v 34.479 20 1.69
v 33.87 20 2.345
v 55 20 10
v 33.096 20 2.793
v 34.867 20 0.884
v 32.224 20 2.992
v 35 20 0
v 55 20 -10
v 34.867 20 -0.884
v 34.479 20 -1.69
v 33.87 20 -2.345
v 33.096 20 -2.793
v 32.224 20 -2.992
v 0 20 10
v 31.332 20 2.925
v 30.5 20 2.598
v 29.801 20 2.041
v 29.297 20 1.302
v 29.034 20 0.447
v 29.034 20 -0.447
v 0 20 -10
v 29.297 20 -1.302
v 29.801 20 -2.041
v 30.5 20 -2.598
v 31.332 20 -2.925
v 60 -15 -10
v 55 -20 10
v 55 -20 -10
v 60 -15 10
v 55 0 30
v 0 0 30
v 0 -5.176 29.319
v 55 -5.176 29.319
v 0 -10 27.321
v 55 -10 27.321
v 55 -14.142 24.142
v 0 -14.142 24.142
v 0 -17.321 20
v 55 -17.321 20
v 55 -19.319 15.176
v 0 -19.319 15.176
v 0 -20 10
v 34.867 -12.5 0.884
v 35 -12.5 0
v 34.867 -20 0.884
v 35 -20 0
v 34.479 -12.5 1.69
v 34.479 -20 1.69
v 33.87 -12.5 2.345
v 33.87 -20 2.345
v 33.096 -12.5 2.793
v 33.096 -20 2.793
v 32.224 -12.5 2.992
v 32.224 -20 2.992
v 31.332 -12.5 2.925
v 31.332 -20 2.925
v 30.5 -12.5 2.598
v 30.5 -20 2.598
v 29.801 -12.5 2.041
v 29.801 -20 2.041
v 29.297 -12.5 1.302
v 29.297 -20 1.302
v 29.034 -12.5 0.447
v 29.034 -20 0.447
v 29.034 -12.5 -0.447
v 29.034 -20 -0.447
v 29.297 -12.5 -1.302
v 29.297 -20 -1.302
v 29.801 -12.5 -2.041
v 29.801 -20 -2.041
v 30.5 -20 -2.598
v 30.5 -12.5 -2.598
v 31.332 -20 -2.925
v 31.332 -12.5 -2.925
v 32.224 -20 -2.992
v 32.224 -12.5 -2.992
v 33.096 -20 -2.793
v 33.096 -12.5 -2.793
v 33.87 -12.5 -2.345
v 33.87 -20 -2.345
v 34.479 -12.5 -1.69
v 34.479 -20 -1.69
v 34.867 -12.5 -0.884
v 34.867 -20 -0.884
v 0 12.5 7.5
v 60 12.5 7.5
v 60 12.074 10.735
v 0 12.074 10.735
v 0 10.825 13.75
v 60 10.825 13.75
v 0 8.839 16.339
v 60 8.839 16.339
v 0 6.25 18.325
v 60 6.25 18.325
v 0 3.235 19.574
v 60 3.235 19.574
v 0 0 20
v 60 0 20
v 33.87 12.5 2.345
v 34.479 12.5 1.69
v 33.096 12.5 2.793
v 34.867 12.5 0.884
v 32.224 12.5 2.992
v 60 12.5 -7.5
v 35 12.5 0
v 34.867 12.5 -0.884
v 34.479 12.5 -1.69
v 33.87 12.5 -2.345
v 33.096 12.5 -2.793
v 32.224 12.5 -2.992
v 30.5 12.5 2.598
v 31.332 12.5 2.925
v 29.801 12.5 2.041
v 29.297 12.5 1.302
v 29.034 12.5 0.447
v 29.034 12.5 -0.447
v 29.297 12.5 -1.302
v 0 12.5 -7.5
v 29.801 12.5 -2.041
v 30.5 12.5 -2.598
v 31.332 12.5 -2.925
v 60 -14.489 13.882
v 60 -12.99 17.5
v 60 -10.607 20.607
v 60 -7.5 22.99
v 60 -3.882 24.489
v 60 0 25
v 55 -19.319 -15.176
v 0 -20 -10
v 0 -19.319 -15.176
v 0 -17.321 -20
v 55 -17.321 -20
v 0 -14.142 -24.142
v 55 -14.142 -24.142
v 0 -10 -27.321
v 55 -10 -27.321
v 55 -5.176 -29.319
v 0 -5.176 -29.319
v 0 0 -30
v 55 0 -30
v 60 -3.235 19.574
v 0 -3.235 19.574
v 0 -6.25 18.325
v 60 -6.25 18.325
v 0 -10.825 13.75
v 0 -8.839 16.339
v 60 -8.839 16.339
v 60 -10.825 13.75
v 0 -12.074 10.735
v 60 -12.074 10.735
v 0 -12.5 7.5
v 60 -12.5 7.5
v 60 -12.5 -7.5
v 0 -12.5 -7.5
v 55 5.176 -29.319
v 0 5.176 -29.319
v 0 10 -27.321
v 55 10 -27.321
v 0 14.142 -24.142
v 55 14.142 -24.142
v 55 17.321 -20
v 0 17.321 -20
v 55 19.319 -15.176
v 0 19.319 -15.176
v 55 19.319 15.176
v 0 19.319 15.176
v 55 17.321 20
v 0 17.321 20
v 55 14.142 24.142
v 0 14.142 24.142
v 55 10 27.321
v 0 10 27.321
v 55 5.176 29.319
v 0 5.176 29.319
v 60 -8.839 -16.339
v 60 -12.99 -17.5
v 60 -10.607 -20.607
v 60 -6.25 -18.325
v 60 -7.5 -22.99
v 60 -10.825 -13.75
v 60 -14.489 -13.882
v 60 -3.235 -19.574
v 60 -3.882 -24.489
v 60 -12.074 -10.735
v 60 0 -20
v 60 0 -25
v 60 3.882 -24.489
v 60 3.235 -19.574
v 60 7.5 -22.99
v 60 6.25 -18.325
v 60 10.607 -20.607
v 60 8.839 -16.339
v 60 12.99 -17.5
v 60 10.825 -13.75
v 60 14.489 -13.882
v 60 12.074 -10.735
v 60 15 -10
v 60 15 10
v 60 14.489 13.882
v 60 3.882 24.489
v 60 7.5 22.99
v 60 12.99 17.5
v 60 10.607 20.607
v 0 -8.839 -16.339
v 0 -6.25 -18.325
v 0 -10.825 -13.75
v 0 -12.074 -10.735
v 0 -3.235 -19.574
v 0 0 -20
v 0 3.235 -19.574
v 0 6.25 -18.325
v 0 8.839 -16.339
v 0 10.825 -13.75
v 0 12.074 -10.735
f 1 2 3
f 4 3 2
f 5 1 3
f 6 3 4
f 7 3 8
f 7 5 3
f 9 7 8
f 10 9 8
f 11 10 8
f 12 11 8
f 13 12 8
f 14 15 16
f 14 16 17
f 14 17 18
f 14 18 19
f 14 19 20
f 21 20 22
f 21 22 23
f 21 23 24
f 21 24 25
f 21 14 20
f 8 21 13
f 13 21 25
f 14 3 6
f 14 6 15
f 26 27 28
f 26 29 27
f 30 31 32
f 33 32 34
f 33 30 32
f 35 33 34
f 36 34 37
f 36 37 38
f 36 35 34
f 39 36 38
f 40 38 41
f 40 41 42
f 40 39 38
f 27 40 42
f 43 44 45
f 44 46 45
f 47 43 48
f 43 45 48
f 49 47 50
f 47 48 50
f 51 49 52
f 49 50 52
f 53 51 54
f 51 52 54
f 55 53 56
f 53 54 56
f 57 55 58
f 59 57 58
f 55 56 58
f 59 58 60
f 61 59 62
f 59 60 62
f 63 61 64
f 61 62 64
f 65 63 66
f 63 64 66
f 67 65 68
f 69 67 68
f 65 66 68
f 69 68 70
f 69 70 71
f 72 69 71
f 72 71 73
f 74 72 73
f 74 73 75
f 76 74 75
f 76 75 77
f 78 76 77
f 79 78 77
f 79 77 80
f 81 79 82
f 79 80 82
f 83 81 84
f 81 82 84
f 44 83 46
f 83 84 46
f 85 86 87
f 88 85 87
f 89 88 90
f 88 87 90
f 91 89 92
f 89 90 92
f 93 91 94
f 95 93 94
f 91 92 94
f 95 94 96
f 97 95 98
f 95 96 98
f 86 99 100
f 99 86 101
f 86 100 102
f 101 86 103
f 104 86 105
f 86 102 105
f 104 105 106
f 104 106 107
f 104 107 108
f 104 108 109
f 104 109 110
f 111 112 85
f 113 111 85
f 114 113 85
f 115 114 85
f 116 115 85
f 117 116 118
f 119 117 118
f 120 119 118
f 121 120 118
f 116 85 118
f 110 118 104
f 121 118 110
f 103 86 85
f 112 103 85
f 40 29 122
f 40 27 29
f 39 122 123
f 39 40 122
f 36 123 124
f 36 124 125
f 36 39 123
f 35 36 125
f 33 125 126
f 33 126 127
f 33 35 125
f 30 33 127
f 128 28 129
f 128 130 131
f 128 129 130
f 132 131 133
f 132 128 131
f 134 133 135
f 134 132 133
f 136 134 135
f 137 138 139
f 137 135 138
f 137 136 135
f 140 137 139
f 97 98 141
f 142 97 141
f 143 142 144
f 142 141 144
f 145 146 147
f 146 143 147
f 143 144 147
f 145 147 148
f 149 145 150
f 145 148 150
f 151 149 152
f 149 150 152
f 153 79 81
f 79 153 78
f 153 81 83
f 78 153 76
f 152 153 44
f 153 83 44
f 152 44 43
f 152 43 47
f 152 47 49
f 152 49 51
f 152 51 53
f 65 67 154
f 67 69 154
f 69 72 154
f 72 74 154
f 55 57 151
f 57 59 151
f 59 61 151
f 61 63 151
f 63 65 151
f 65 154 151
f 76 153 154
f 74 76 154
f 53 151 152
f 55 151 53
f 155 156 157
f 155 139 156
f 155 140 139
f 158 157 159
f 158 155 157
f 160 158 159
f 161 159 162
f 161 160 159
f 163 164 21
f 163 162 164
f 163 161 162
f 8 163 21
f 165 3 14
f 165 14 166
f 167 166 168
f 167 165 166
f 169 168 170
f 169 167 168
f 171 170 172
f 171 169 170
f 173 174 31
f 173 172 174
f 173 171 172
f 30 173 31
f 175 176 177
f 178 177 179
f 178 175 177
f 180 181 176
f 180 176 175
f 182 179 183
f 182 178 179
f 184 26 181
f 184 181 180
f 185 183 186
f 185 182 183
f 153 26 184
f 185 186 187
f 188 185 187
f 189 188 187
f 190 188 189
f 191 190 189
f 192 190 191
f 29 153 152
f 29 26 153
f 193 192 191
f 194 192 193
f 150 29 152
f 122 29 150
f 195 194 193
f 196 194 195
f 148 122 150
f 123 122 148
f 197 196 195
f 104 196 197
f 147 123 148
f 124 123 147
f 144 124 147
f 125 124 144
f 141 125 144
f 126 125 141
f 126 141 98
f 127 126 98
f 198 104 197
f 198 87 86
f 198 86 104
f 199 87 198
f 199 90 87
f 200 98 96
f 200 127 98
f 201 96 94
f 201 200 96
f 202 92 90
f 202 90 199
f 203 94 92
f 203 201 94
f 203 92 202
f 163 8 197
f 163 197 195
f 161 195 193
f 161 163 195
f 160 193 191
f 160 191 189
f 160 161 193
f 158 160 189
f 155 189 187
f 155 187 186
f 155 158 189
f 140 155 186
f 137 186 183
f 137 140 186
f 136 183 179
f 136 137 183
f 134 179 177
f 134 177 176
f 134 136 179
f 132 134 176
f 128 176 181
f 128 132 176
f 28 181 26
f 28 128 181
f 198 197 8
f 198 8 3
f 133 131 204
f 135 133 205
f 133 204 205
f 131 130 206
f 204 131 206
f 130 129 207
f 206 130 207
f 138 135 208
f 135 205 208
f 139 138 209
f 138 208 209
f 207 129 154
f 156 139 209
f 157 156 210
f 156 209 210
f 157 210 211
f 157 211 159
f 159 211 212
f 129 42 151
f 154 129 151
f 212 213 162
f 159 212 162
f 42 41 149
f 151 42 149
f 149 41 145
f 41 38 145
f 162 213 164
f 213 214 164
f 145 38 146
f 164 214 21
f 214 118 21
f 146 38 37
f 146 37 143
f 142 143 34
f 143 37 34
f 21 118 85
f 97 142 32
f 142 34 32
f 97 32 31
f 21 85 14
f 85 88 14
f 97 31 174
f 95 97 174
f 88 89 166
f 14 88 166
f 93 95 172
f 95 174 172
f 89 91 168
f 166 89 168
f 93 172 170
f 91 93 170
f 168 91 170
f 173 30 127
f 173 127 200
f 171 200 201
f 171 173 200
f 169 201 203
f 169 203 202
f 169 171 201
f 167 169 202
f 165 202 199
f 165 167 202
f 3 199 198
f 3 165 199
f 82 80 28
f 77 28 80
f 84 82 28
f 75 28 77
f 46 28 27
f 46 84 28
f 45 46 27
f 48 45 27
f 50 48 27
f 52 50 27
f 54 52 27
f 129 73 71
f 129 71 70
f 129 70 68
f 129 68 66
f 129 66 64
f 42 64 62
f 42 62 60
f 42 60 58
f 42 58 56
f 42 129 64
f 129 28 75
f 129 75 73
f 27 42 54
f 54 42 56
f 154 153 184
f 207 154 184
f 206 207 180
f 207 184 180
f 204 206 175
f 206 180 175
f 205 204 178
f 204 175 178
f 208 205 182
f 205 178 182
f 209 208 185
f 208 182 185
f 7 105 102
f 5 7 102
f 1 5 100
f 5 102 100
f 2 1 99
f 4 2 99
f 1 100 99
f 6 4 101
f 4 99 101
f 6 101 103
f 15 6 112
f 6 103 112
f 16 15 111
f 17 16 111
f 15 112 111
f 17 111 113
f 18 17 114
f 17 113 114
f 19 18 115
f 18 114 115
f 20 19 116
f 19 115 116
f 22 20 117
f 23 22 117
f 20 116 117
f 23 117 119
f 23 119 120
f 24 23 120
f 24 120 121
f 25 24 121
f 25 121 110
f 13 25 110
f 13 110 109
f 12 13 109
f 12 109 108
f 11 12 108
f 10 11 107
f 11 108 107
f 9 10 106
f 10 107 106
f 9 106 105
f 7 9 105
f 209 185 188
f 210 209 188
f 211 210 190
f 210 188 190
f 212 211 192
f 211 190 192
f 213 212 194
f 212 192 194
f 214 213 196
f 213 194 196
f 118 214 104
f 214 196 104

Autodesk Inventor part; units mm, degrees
ref_plane "YZ Plane" through (0, 0, 0) normal (1, 0, 0) x (0, 1, 0)
ref_plane "XZ Plane" through (0, 0, 0) normal (0, 1, 0) x (-1, 0, 0)
ref_plane "XY Plane" through (0, 0, 0) normal (0, 0, 1) x (1, 0, 0)
sketch "草圖1" plane through (0, 0, 0) normal (1, 0, 0) x (0, 1, 0)
  line L0 (-20, 30) -> (20, 30)
  line L1 (20, 30) -> (20, -30)
  line L2 (20, -30) -> (-20, -30)
  line L3 (-20, -30) -> (-20, 30)
  line L4 (-20, 30) -> (20, -30) construction
  line L5 (20, 30) -> (-20, -30) construction
  line L6 (-12.5, 20) -> (12.5, 20)
  line L7 (12.5, 20) -> (12.5, -20)
  line L8 (12.5, -20) -> (-12.5, -20)
  line L9 (-12.5, -20) -> (-12.5, 20)
  line L10 (-12.5, 20) -> (12.5, -20) construction
  line L11 (12.5, 20) -> (-12.5, -20) construction
  point P0 (0, 0)
  dimension "d0" = 40
  dimension "d1" = 60
  dimension "d2" = 25
  dimension "d3" = 40
extrude "擠出1" add sketch "草圖1" along normal blind 60
fillet "圓角1" radius 20 4 edges at (30, 20, 30) (30, -20, 30) (30, 20, -30) (30, -20, -30)
fillet "圓角2" radius 12.5 4 edges at (30, 12.5, 20) (30, -12.5, 20) (30, -12.5, -20) (30, 12.5, -20)
chamfer "倒角1" distance 5 angle 45 4 edges at (60, 14.1422, -24.1422) (60, -20, 0) (60, 14.1422, 24.1422) (60, 20, 0)
sketch "草圖2" plane through (0, -20, -10) normal (0, -1, 0) x (1, 0, 0)
  line L0 (-12, 10) -> (72, 10) projected
  line L1 (0, -32) -> (0, 52) projected
  line L2 (60, 0) -> (60, 20) projected
  line L3 (32, 0) -> (32, 20)
  circle A0 centre (32, 10) radius 3
  point P0 (0, 10)
  dimension "d11" = 28
  dimension "d12" = 6
extrude "擠出2" cut sketch "草圖2" against normal blind 157.75
properties part number "exercise3-8"
